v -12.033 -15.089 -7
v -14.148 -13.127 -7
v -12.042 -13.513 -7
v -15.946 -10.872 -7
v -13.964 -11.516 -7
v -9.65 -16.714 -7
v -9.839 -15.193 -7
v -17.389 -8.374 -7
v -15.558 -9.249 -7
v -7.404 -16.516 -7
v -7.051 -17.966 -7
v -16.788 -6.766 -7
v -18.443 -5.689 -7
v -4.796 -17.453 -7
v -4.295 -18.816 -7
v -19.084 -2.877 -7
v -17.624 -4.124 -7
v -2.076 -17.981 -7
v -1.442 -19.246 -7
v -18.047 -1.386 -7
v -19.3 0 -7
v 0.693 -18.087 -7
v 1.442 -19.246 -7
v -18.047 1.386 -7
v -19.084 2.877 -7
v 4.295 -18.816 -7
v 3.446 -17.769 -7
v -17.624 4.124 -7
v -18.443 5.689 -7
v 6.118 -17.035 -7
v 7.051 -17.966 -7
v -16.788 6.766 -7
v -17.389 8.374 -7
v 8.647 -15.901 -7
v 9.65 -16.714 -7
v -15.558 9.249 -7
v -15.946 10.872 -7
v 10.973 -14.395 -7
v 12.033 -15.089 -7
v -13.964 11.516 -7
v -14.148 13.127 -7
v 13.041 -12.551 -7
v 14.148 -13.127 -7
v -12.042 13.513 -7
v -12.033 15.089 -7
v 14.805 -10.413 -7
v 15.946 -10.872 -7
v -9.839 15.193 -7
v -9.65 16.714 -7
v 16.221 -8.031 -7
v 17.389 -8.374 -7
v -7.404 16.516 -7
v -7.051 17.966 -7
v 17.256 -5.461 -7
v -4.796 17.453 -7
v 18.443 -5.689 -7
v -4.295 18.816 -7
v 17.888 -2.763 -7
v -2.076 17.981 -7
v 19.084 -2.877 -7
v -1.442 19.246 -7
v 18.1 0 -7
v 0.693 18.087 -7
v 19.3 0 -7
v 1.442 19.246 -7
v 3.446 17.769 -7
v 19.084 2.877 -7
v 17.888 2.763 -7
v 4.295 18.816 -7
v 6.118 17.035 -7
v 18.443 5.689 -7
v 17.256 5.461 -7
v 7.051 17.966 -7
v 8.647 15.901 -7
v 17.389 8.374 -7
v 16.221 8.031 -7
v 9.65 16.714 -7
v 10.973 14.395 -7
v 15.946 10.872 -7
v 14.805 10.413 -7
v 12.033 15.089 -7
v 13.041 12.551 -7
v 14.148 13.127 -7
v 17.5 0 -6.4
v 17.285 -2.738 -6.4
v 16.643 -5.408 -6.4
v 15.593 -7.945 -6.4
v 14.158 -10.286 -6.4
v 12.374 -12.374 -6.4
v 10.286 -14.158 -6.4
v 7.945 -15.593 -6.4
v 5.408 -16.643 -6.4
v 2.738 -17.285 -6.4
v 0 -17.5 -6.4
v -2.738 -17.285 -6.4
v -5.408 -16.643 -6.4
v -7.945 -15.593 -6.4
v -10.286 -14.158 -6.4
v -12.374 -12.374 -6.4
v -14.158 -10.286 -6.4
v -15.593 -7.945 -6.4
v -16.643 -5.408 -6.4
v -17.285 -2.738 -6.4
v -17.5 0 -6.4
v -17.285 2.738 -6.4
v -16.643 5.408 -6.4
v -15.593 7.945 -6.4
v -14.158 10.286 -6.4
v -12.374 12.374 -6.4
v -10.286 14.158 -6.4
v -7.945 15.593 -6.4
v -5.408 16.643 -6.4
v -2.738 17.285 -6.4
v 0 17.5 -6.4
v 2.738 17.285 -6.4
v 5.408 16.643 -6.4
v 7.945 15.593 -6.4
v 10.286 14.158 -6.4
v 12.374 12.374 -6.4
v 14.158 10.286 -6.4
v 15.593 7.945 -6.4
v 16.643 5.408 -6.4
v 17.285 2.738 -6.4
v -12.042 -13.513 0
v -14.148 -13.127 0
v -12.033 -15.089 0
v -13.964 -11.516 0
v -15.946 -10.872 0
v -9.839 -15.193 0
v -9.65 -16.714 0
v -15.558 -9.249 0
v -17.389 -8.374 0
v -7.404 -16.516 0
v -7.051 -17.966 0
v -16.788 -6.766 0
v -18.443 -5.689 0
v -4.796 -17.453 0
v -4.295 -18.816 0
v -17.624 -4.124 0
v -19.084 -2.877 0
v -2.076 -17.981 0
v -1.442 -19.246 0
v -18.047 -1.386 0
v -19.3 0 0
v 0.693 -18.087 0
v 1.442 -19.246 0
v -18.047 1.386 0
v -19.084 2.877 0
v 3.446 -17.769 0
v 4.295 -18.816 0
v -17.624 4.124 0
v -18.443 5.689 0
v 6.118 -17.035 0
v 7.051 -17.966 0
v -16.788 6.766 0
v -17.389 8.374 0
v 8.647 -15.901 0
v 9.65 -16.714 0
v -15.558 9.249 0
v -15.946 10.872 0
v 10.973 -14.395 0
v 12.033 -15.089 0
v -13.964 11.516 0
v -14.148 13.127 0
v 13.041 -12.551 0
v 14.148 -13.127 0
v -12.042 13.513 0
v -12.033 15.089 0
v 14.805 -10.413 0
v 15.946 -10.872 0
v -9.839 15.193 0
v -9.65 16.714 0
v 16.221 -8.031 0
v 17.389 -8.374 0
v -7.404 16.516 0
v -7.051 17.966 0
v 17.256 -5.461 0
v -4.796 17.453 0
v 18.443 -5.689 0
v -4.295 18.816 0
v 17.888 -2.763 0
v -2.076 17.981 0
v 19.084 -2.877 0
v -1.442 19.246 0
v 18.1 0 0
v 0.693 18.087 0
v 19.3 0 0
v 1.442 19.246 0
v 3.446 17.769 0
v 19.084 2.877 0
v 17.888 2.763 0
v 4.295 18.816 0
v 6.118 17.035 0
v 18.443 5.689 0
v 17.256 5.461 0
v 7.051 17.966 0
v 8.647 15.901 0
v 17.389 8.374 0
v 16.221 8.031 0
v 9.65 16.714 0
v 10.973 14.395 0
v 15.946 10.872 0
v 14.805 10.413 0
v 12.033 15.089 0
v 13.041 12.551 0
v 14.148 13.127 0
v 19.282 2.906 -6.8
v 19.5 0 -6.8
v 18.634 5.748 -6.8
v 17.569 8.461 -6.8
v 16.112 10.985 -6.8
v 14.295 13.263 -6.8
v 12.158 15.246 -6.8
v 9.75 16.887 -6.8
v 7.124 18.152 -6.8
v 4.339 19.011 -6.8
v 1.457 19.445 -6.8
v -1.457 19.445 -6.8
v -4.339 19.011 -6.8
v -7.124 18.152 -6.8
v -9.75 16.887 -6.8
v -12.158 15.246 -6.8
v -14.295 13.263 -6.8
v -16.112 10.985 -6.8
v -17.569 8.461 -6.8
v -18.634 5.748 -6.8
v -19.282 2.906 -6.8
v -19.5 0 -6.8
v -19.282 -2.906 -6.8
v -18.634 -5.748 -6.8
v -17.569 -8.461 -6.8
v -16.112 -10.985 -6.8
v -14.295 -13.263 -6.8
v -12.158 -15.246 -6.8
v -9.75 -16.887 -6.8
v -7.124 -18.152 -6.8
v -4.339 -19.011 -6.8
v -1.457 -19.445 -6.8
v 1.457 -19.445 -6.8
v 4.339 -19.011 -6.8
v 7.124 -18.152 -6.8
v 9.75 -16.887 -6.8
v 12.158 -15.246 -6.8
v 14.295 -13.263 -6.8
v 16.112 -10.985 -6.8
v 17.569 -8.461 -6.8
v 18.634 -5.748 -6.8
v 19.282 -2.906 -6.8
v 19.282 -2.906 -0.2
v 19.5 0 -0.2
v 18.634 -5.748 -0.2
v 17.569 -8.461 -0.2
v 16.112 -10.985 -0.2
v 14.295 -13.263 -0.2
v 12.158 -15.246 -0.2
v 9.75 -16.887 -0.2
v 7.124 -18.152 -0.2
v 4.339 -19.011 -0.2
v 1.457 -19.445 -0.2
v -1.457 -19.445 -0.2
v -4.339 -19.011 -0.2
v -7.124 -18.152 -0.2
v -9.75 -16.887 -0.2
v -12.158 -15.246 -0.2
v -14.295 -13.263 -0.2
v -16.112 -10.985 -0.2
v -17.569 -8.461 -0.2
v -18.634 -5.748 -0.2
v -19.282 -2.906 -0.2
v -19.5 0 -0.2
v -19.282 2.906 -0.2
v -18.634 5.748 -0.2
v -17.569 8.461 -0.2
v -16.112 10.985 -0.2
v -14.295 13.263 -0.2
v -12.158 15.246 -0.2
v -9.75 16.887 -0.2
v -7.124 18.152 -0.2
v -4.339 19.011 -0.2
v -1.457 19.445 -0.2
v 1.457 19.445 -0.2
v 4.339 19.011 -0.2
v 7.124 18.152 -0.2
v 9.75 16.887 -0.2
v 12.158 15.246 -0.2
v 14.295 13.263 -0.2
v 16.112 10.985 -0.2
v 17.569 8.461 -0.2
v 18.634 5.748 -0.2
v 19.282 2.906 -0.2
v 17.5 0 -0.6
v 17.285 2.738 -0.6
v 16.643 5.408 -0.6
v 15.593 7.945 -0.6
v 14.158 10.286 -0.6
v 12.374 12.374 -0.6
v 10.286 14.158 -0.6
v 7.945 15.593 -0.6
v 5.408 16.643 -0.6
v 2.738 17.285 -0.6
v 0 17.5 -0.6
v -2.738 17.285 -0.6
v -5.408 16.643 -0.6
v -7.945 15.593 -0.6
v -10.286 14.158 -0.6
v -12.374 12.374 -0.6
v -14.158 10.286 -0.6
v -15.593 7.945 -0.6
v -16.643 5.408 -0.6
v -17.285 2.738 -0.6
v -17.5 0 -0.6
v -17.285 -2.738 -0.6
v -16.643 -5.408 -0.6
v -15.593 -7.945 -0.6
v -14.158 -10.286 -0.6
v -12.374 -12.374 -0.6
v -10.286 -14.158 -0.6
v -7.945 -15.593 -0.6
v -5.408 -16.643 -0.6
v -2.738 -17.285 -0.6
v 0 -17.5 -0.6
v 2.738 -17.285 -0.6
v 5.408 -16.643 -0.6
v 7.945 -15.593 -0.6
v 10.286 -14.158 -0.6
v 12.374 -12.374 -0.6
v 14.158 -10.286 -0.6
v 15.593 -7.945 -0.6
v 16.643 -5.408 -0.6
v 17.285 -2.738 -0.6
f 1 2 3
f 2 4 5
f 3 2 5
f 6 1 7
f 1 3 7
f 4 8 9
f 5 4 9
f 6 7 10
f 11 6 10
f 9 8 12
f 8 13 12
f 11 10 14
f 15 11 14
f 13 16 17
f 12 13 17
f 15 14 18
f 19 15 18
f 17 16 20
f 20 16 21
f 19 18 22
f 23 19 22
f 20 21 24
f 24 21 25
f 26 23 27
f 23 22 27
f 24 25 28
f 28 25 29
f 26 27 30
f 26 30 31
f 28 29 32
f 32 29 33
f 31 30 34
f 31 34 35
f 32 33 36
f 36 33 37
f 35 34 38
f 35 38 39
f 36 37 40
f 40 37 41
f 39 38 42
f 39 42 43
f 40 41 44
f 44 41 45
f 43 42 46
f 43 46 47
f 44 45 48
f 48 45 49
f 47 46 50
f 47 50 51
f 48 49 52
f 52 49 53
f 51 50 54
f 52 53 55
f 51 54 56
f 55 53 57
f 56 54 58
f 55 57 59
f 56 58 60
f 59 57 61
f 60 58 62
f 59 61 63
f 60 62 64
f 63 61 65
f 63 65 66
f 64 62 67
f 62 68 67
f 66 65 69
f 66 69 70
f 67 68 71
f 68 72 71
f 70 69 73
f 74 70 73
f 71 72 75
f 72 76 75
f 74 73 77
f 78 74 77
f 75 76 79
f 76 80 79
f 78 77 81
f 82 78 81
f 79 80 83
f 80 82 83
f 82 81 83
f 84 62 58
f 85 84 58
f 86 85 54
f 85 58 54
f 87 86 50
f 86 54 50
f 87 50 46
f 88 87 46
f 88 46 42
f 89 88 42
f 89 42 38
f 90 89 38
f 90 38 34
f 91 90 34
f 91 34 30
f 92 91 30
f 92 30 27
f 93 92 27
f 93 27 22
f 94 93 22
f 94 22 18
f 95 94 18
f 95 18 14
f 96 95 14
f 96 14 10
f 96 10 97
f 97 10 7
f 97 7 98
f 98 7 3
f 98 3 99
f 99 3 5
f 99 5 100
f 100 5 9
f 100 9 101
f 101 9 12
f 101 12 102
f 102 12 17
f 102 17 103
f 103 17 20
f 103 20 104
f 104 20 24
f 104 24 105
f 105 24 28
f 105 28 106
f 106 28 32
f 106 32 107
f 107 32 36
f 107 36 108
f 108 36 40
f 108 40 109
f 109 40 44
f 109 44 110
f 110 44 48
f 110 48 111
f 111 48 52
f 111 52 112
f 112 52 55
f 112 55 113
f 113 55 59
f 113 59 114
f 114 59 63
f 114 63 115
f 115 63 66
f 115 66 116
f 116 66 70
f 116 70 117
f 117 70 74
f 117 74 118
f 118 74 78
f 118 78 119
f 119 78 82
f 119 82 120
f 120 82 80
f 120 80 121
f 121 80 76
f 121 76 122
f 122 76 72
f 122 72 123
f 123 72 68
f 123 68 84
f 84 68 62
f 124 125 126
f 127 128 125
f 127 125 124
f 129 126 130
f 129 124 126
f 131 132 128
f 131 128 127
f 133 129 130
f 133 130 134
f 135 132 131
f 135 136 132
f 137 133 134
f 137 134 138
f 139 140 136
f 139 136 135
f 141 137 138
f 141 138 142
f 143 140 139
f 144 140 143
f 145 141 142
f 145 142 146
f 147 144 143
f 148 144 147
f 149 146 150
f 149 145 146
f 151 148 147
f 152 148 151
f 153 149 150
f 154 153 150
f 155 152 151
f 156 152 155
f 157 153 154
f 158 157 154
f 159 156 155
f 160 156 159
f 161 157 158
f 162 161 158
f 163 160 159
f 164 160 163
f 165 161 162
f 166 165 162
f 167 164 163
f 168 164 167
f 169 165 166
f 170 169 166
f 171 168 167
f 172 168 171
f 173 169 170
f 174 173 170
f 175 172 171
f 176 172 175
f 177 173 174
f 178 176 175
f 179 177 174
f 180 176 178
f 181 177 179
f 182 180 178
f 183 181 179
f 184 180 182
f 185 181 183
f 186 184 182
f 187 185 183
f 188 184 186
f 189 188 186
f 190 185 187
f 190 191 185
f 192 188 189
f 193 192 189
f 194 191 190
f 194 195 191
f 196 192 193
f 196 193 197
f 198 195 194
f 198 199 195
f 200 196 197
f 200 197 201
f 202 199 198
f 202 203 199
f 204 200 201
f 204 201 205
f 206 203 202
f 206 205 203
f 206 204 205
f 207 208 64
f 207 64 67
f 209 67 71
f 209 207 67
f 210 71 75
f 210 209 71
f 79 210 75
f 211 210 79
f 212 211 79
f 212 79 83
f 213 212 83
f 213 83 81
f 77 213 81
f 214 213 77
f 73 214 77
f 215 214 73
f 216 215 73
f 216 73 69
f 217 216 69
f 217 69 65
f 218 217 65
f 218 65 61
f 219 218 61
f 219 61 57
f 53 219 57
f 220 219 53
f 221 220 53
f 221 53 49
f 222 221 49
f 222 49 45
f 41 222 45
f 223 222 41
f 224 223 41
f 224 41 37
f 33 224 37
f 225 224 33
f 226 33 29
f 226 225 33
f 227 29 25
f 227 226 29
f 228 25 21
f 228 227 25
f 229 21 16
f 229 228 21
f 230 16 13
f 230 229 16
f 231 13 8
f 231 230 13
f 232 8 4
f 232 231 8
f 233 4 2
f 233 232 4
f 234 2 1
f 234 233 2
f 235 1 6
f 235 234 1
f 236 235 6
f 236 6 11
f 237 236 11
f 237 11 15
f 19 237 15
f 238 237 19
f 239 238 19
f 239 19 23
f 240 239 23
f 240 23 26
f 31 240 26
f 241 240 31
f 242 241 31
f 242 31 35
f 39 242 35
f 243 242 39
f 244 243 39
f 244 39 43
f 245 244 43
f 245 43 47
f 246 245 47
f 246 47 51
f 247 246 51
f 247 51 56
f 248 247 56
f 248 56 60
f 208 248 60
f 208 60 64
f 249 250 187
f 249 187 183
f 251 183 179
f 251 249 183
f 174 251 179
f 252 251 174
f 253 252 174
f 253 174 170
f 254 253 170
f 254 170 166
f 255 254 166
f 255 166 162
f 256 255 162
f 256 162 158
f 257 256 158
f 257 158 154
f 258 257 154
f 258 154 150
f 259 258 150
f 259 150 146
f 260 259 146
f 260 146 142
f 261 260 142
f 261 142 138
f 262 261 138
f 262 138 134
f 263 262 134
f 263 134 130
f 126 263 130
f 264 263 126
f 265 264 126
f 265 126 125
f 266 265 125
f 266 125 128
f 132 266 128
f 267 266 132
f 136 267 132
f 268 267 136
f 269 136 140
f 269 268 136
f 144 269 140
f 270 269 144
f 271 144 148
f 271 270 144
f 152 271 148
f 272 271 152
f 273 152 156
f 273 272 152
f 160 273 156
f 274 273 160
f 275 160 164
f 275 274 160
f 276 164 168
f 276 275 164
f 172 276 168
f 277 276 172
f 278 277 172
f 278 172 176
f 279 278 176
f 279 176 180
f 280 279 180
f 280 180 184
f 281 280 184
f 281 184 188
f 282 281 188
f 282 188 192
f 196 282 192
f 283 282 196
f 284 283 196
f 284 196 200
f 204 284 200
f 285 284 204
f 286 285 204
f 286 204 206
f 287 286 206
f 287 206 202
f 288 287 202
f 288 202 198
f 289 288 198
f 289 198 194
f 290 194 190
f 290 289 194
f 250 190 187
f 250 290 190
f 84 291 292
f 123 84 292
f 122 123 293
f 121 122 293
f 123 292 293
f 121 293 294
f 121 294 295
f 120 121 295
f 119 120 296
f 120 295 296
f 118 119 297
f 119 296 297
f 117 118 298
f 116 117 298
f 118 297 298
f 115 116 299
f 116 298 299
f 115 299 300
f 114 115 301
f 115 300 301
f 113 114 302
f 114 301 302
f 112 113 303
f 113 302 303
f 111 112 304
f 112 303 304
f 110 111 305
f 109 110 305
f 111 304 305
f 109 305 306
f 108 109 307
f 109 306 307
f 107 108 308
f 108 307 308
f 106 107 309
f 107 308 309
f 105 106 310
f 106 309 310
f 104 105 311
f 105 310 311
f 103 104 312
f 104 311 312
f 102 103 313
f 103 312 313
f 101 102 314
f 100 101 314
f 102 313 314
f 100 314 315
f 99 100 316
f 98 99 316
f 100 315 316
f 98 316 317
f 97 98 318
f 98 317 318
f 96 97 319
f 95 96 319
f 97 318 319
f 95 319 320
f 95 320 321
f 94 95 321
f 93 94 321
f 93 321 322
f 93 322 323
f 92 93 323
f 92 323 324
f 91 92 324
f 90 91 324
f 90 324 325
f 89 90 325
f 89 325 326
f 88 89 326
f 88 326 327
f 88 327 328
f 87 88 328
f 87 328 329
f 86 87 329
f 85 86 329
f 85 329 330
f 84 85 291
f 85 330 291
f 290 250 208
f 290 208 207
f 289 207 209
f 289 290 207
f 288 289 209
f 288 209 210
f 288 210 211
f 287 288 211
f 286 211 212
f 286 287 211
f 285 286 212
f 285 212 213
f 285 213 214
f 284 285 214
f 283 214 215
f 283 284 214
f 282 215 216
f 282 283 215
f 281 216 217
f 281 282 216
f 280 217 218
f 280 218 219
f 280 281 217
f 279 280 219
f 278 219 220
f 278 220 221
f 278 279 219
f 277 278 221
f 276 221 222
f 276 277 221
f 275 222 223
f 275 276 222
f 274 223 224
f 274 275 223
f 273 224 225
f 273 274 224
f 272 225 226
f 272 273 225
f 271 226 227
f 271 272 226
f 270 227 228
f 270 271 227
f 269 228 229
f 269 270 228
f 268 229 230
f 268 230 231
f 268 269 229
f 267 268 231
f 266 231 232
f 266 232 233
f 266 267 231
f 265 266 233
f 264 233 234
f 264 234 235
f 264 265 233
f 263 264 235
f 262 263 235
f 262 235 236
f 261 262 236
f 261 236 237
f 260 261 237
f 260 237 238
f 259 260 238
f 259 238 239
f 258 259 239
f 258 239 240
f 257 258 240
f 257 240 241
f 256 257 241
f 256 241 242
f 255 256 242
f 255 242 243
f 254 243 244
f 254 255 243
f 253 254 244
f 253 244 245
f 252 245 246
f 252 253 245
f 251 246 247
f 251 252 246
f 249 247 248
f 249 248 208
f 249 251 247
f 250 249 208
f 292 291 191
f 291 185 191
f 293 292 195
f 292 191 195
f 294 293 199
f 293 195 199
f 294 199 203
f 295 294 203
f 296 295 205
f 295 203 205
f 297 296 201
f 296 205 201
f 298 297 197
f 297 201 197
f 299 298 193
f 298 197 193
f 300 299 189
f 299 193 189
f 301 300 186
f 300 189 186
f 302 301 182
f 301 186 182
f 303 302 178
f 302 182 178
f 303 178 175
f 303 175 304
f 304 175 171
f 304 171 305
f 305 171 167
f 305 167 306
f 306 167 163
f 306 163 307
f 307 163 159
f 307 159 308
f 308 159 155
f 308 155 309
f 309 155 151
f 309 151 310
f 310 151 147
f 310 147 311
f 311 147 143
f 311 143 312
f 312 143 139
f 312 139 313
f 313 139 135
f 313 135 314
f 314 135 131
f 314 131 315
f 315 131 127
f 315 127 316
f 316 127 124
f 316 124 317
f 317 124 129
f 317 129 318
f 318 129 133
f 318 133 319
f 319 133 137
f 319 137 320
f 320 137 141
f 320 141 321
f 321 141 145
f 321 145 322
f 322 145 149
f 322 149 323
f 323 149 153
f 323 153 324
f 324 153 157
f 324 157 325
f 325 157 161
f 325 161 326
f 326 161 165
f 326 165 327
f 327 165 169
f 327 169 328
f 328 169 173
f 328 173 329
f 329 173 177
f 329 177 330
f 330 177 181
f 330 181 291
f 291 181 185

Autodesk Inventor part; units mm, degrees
ref_plane "YZ Plane" through (0, 0, 0) normal (1, 0, 0) x (0, 1, 0)
ref_plane "XZ Plane" through (0, 0, 0) normal (0, 1, 0) x (-1, 0, 0)
ref_plane "XY Plane" through (0, 0, 0) normal (0, 0, 1) x (1, 0, 0)
sketch "Sketch1" plane through (0, 0, 0) normal (0, 0, 1) x (1, 0, 0)
  circle A0 centre (0, 0) radius 19.5
  circle A1 centre (0, 0) radius 17.5
  dimension "d0" = 39
  dimension "d1" = 35
extrude "Extrusion1" add sketch "Sketch1" against normal blind 7
chamfer "Chamfer1" distance 0.6 angle 45 2 edges at (-17.5, 0, -7) (-17.5, 0, 0)
chamfer "Chamfer2" distance 0.2 angle 45 2 edges at (-19.5, 0, -7) (-19.5, 0, 0)
properties part number "6807-inner"
